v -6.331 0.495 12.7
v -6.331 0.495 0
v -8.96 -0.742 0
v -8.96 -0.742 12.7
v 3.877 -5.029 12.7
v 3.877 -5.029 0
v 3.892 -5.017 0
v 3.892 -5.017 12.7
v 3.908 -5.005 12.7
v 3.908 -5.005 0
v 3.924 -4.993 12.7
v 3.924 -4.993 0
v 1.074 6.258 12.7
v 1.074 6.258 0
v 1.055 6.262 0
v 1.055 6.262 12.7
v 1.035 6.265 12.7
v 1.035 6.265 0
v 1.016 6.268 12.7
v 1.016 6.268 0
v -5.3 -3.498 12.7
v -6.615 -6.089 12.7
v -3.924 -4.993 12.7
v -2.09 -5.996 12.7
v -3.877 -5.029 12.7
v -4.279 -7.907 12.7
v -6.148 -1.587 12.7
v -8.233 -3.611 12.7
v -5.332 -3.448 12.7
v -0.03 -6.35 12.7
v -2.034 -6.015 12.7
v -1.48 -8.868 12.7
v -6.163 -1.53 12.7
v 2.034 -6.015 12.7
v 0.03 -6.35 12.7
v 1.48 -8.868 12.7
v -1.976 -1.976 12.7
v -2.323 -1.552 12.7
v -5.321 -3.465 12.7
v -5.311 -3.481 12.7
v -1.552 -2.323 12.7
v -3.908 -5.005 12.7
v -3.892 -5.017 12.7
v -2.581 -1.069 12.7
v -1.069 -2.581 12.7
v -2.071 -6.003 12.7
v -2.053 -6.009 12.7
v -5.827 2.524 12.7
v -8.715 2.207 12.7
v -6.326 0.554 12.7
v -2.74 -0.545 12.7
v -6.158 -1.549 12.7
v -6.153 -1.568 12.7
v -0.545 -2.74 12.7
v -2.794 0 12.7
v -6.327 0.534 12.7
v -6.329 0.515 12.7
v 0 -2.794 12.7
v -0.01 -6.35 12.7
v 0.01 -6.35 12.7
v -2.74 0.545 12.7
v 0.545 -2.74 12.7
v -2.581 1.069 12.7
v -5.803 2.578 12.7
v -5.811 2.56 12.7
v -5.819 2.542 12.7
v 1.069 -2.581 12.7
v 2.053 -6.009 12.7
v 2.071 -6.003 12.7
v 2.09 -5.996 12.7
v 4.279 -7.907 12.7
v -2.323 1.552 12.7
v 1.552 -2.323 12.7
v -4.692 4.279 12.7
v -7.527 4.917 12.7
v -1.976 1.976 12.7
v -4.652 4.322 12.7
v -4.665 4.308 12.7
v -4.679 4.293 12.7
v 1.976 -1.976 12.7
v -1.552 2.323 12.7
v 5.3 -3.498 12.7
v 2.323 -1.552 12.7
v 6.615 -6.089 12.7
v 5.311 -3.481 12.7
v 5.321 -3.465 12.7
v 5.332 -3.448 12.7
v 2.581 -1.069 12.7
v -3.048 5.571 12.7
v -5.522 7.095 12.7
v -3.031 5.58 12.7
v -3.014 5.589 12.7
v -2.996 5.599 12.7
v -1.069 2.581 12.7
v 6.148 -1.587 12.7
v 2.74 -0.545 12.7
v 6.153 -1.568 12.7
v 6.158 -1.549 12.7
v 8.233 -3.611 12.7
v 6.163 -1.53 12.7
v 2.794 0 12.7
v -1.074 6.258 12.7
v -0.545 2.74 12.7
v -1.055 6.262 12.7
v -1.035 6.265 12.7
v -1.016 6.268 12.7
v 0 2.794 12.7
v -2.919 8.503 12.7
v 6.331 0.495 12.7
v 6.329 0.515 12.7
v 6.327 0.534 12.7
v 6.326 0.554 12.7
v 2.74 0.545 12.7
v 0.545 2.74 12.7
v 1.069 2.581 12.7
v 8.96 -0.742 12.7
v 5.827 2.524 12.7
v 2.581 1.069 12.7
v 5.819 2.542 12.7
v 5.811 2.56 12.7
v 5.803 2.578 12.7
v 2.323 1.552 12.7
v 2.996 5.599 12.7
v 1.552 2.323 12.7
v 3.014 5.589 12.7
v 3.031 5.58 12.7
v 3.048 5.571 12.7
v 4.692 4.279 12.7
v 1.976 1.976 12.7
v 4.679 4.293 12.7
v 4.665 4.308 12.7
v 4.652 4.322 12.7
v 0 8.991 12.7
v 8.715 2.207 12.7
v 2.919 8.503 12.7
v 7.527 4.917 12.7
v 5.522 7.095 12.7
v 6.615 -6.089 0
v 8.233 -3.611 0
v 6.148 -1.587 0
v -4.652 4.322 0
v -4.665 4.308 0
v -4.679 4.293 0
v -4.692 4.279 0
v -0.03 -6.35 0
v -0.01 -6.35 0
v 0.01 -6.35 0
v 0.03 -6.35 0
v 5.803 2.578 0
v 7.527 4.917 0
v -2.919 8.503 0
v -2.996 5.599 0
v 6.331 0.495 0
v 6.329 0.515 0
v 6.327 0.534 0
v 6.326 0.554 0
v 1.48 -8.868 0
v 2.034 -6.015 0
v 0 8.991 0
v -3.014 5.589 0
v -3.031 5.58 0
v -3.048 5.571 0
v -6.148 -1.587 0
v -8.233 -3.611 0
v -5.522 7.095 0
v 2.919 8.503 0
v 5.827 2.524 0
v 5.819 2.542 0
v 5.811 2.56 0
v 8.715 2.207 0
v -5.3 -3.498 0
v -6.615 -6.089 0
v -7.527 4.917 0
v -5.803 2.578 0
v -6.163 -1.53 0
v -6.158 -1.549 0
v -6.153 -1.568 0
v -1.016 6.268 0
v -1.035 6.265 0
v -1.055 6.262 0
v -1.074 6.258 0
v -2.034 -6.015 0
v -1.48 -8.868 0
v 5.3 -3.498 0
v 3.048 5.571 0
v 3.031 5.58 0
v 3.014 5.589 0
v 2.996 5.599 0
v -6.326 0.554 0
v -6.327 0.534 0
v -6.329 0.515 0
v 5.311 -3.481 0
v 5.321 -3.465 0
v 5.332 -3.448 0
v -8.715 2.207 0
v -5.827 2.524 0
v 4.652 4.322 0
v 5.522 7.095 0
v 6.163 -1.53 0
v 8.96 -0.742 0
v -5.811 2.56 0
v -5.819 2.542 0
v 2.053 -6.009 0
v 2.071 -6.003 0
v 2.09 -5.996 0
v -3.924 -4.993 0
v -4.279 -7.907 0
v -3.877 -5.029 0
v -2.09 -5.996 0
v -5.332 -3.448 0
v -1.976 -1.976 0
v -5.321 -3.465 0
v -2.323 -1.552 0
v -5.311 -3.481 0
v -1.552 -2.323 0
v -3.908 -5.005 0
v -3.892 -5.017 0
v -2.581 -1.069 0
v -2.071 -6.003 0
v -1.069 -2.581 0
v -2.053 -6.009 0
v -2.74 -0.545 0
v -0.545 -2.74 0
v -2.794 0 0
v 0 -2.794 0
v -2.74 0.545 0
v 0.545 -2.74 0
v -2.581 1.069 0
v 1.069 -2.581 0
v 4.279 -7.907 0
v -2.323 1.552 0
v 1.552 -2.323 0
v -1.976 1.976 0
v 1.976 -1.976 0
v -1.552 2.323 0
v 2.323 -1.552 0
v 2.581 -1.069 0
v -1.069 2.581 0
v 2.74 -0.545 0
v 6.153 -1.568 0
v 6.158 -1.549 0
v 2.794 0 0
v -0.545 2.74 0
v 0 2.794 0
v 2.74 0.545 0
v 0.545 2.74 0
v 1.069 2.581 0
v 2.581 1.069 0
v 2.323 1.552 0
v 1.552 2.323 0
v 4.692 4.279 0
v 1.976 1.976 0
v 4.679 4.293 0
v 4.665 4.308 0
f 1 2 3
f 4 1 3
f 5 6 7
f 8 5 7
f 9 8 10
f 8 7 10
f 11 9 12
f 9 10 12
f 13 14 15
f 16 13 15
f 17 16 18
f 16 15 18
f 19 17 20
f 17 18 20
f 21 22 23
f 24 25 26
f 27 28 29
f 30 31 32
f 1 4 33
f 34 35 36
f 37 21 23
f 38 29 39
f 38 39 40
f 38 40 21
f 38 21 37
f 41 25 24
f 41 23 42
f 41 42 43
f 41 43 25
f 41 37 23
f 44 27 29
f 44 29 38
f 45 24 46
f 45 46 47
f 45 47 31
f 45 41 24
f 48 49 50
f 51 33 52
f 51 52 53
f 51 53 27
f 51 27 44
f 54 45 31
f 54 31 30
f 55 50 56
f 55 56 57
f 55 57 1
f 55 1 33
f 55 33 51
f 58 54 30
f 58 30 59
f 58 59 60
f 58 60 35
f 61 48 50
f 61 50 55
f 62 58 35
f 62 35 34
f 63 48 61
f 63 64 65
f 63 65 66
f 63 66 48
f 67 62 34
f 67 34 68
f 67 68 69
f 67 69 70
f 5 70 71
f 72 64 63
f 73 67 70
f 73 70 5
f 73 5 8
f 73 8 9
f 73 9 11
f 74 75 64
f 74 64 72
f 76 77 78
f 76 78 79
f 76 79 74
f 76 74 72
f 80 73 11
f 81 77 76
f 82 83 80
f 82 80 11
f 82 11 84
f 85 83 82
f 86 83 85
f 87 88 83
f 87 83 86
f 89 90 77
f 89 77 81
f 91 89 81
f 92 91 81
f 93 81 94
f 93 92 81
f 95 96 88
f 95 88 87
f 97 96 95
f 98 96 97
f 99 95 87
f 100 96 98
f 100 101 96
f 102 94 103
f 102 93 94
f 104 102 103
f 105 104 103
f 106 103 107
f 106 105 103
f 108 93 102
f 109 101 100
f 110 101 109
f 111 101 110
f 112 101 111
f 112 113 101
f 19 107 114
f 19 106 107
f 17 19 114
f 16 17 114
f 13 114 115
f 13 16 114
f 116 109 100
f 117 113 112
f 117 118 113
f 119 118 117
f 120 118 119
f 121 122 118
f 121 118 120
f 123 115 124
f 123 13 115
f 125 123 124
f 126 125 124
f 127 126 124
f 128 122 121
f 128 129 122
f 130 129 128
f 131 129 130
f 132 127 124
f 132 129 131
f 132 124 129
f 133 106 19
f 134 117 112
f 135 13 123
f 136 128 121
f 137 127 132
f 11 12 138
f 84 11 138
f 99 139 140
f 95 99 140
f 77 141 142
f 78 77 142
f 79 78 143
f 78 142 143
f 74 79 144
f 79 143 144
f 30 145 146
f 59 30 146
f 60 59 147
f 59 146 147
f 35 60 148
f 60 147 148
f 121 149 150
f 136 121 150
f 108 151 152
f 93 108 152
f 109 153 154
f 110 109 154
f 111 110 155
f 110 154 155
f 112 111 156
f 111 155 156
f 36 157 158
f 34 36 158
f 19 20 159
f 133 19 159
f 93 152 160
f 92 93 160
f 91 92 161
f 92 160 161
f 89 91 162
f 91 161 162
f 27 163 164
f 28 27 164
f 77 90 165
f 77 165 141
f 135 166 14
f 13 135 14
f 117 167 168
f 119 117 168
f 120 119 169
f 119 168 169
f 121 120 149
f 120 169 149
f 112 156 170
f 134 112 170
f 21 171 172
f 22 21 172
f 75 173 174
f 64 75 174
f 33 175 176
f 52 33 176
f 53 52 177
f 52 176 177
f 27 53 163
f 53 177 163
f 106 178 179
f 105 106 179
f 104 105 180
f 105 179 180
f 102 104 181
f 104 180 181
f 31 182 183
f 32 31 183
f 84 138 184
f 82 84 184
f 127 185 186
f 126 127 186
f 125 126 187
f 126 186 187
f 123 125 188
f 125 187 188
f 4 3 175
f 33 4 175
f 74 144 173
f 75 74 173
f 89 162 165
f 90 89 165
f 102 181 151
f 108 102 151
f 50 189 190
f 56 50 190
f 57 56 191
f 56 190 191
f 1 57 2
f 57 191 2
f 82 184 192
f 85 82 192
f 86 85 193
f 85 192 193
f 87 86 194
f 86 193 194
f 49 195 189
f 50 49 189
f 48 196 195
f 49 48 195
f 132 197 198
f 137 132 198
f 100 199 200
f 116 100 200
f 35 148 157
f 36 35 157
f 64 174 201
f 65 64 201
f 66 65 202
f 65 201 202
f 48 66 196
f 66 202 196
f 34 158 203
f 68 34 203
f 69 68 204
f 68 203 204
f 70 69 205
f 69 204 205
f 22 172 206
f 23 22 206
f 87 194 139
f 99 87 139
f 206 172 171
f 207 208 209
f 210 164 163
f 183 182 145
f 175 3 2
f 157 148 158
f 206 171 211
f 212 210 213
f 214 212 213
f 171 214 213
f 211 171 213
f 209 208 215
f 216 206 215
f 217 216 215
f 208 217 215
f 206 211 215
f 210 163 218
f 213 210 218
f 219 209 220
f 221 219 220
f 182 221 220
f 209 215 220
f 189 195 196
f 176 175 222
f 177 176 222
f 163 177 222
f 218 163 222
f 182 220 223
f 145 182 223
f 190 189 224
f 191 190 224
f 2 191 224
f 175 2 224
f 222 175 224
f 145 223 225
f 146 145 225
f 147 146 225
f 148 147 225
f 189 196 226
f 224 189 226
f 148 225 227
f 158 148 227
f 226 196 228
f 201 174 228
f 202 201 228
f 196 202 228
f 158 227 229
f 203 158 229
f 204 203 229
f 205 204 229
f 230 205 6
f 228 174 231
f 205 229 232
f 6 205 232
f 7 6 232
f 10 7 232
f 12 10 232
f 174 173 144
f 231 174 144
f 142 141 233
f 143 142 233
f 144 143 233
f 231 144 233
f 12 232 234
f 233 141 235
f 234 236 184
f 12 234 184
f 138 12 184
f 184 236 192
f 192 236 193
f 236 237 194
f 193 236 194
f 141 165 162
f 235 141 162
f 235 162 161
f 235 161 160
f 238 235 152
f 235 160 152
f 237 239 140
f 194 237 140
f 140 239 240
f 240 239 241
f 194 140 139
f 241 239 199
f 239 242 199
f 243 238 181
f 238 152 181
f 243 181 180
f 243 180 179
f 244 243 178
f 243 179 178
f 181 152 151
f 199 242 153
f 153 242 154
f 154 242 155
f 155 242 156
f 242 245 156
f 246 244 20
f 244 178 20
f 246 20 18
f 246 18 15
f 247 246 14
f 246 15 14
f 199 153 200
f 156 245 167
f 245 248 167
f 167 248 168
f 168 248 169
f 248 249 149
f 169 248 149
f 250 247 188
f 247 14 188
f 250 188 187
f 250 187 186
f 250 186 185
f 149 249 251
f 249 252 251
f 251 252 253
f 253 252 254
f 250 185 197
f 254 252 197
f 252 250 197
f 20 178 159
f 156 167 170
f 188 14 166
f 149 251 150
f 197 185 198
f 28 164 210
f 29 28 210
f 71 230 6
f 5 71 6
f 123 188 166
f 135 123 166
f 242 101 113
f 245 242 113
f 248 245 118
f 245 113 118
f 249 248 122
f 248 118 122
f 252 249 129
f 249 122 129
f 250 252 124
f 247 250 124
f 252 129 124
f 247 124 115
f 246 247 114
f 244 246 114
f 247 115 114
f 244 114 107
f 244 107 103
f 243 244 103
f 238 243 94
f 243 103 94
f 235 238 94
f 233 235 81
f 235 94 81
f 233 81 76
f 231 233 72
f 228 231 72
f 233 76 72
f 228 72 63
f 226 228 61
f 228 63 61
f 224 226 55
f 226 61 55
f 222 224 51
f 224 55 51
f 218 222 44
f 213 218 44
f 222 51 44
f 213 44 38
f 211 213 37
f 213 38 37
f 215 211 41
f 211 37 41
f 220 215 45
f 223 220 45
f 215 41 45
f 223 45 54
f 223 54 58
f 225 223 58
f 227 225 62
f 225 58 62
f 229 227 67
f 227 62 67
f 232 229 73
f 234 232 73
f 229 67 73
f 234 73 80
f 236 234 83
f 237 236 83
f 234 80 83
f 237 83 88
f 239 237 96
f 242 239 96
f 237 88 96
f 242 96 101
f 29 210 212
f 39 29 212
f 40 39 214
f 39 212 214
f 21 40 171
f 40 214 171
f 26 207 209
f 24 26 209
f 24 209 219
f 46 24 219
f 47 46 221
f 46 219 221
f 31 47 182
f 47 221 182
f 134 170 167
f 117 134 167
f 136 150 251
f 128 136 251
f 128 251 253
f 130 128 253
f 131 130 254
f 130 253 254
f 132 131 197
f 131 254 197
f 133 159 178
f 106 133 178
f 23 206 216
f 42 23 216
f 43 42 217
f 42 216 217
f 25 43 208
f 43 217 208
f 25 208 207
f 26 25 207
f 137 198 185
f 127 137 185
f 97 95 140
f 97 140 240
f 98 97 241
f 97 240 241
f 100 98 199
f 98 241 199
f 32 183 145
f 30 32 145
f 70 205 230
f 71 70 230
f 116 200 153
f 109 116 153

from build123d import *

# Parameters (mm, degrees)
F1_DEPTH = 12.7
F2_R     = 2.794
F3_DEPTH = 12.7


with BuildPart() as f1:
    # F0 (on Top) → F1 (new body)
    with BuildSketch(Plane.XY):
        with BuildLine():
            ThreePointArc((6.162883, -1.530153), (6.303047, -0.770776), (6.35, 0))
            ThreePointArc((6.35, 0), (6.345169, 0.247642), (6.330685, 0.494907))
            ThreePointArc((6.330685, 0.494907), (6.328312, 0.524379), (6.325801, 0.55384))
            ThreePointArc((6.325801, 0.55384), (6.155692, 1.558833), (5.826975, 2.523661))
            ThreePointArc((5.826975, 2.523661), (5.815161, 2.550766), (5.80322, 2.577815))
            ThreePointArc((5.80322, 2.577815), (5.316007, 3.473121), (4.691822, 4.278938))
            ThreePointArc((4.691822, 4.278938), (4.671847, 4.300738), (4.651771, 4.322445))
            ThreePointArc((4.651771, 4.322445), (3.900251, 5.011042), (3.048237, 5.570525))
            ThreePointArc((3.048237, 5.570525), (3.022266, 5.584658), (2.996229, 5.59867))
            ThreePointArc((2.996229, 5.59867), (2.061842, 6.005939), (1.074329, 6.25846))
            ThreePointArc((1.074329, 6.25846), (1.045176, 6.263394), (1.016, 6.268193))
            ThreePointArc((1.016, 6.268193), (0, 6.35), (-1.016, 6.268193))
            ThreePointArc((-1.016, 6.268193), (-1.045176, 6.263394), (-1.074329, 6.25846))
            ThreePointArc((-1.074329, 6.25846), (-2.061842, 6.005939), (-2.996229, 5.59867))
            ThreePointArc((-2.996229, 5.59867), (-3.022266, 5.584658), (-3.048237, 5.570525))
            ThreePointArc((-3.048237, 5.570525), (-3.900251, 5.011042), (-4.651771, 4.322445))
            ThreePointArc((-4.651771, 4.322445), (-4.671847, 4.300738), (-4.691822, 4.278938))
            ThreePointArc((-4.691822, 4.278938), (-5.316007, 3.473121), (-5.80322, 2.577815))
            ThreePointArc((-5.80322, 2.577815), (-5.815161, 2.550766), (-5.826975, 2.523661))
            ThreePointArc((-5.826975, 2.523661), (-6.155692, 1.558833), (-6.325801, 0.55384))
            ThreePointArc((-6.325801, 0.55384), (-6.328312, 0.524379), (-6.330685, 0.494907))
            ThreePointArc((-6.330685, 0.494907), (-6.328312, -0.524379), (-6.162883, -1.530153))
            ThreePointArc((-6.162883, -1.530153), (-6.155692, -1.558833), (-6.148367, -1.587479))
            ThreePointArc((-6.148367, -1.587479), (-5.815161, -2.550766), (-5.332121, -3.44833))
            ThreePointArc((-5.332121, -3.44833), (-5.316007, -3.473121), (-5.299778, -3.497836))
            ThreePointArc((-5.299778, -3.497836), (-4.671847, -4.300738), (-3.923541, -4.992827))
            ThreePointArc((-3.923541, -4.992827), (-3.900251, -5.011042), (-3.876875, -5.029149))
            ThreePointArc((-3.876875, -5.029149), (-3.022266, -5.584658), (-2.089785, -5.996274))
            ThreePointArc((-2.089785, -5.996274), (-2.061842, -6.005939), (-2.033854, -6.015475))
            ThreePointArc((-2.033854, -6.015475), (-1.045176, -6.263394), (-0.029568, -6.349931))
            ThreePointArc((-0.029568, -6.349931), (0, -6.35), (0.029568, -6.349931))
            ThreePointArc((0.029568, -6.349931), (1.045176, -6.263394), (2.033854, -6.015475))
            ThreePointArc((2.033854, -6.015475), (2.061842, -6.005939), (2.089785, -5.996274))
            ThreePointArc((2.089785, -5.996274), (3.022266, -5.584658), (3.876875, -5.029149))
            ThreePointArc((3.876875, -5.029149), (3.900251, -5.011042), (3.923541, -4.992827))
            ThreePointArc((3.923541, -4.992827), (4.671847, -4.300738), (5.299778, -3.497836))
            ThreePointArc((5.299778, -3.497836), (5.316007, -3.473121), (5.332121, -3.44833))
            ThreePointArc((5.332121, -3.44833), (5.815161, -2.550766), (6.148367, -1.587479))
            ThreePointArc((6.148367, -1.587479), (6.155692, -1.558833), (6.162883, -1.530153))
        make_face()
        with BuildLine():
            ThreePointArc((1.074329, 6.25846), (2.061842, 6.005939), (2.996229, 5.59867))
            Line((2.996229, 5.59867), (2.919235, 8.50344))
            Line((2.919235, 8.50344), (1.074329, 6.25846))
        make_face()
        with BuildLine():
            ThreePointArc((-6.325801, 0.55384), (-6.155692, 1.558833), (-5.826975, 2.523661))
            Line((-5.826975, 2.523661), (-8.715465, 2.207055))
            Line((-8.715465, 2.207055), (-6.325801, 0.55384))
        make_face()
        with BuildLine():
            ThreePointArc((-4.651771, 4.322445), (-3.900251, 5.011042), (-3.048237, 5.570525))
            Line((-3.048237, 5.570525), (-5.522125, 7.094826))
            Line((-5.522125, 7.094826), (-4.651771, 4.322445))
        make_face()
        with BuildLine():
            ThreePointArc((5.826975, 2.523661), (6.155692, 1.558833), (6.325801, 0.55384))
            Line((6.325801, 0.55384), (8.715465, 2.207055))
            Line((8.715465, 2.207055), (5.826975, 2.523661))
        make_face()
        with BuildLine():
            ThreePointArc((6.330685, 0.494907), (6.345169, 0.247642), (6.35, 0))
            ThreePointArc((6.35, 0), (6.303047, -0.770776), (6.162883, -1.530153))
            Line((6.162883, -1.530153), (8.959866, -0.742436))
            Line((8.959866, -0.742436), (6.330685, 0.494907))
        make_face()
        with BuildLine():
            Line((8.233328, -3.611472), (6.148367, -1.587479))
            ThreePointArc((6.148367, -1.587479), (5.815161, -2.550766), (5.332121, -3.44833))
            Line((5.332121, -3.44833), (8.233328, -3.611472))
        make_face()
        with BuildLine():
            Line((-4.27904, -7.906974), (-2.089785, -5.996274))
            ThreePointArc((-2.089785, -5.996274), (-3.022266, -5.584658), (-3.876875, -5.029149))
            Line((-3.876875, -5.029149), (-4.27904, -7.906974))
        make_face()
        with BuildLine():
            Line((-6.61458, -6.08915), (-3.923541, -4.992827))
            ThreePointArc((-3.923541, -4.992827), (-4.671847, -4.300738), (-5.299778, -3.497836))
            Line((-5.299778, -3.497836), (-6.61458, -6.08915))
        make_face()
        with BuildLine():
            Line((-8.959866, -0.742436), (-6.162883, -1.530153))
            ThreePointArc((-6.162883, -1.530153), (-6.328312, -0.524379), (-6.330685, 0.494907))
            Line((-6.330685, 0.494907), (-8.959866, -0.742436))
        make_face()
        with BuildLine():
            ThreePointArc((-5.80322, 2.577815), (-5.316007, 3.473121), (-4.691822, 4.278938))
            Line((-4.691822, 4.278938), (-7.526607, 4.917378))
            Line((-7.526607, 4.917378), (-5.80322, 2.577815))
        make_face()
        with BuildLine():
            ThreePointArc((-2.996229, 5.59867), (-2.061842, 6.005939), (-1.074329, 6.25846))
            Line((-1.074329, 6.25846), (-2.919235, 8.50344))
            Line((-2.919235, 8.50344), (-2.996229, 5.59867))
        make_face()
        with BuildLine():
            ThreePointArc((-1.016, 6.268193), (0, 6.35), (1.016, 6.268193))
            Line((1.016, 6.268193), (0, 8.990574))
            Line((0, 8.990574), (-1.016, 6.268193))
        make_face()
        with BuildLine():
            ThreePointArc((3.048237, 5.570525), (3.900251, 5.011042), (4.651771, 4.322445))
            Line((4.651771, 4.322445), (5.522125, 7.094826))
            Line((5.522125, 7.094826), (3.048237, 5.570525))
        make_face()
        with BuildLine():
            Line((1.4798, -8.867954), (2.033854, -6.015475))
            ThreePointArc((2.033854, -6.015475), (1.045176, -6.263394), (0.029568, -6.349931))
            Line((0.029568, -6.349931), (1.4798, -8.867954))
        make_face()
        with BuildLine():
            Line((-1.4798, -8.867954), (-0.029568, -6.349931))
            ThreePointArc((-0.029568, -6.349931), (-1.045176, -6.263394), (-2.033854, -6.015475))
            Line((-2.033854, -6.015475), (-1.4798, -8.867954))
        make_face()
        with BuildLine():
            Line((4.27904, -7.906974), (3.876875, -5.029149))
            ThreePointArc((3.876875, -5.029149), (3.022266, -5.584658), (2.089785, -5.996274))
            Line((2.089785, -5.996274), (4.27904, -7.906974))
        make_face()
        with BuildLine():
            Line((6.61458, -6.08915), (5.299778, -3.497836))
            ThreePointArc((5.299778, -3.497836), (4.671847, -4.300738), (3.923541, -4.992827))
            Line((3.923541, -4.992827), (6.61458, -6.08915))
        make_face()
        with BuildLine():
            ThreePointArc((4.691822, 4.278938), (5.316007, 3.473121), (5.80322, 2.577815))
            Line((5.80322, 2.577815), (7.526607, 4.917378))
            Line((7.526607, 4.917378), (4.691822, 4.278938))
        make_face()
        with BuildLine():
            Line((-8.233328, -3.611472), (-5.332121, -3.44833))
            ThreePointArc((-5.332121, -3.44833), (-5.815161, -2.550766), (-6.148367, -1.587479))
            Line((-6.148367, -1.587479), (-8.233328, -3.611472))
        make_face()
    extrude(amount=F1_DEPTH)

    # F2 (on face) → F3 (cut)
    with BuildSketch(Plane.XY.offset(12.7)):
        Circle(F2_R)
    extrude(amount=-F3_DEPTH, mode=Mode.SUBTRACT)


solid = f1.part
